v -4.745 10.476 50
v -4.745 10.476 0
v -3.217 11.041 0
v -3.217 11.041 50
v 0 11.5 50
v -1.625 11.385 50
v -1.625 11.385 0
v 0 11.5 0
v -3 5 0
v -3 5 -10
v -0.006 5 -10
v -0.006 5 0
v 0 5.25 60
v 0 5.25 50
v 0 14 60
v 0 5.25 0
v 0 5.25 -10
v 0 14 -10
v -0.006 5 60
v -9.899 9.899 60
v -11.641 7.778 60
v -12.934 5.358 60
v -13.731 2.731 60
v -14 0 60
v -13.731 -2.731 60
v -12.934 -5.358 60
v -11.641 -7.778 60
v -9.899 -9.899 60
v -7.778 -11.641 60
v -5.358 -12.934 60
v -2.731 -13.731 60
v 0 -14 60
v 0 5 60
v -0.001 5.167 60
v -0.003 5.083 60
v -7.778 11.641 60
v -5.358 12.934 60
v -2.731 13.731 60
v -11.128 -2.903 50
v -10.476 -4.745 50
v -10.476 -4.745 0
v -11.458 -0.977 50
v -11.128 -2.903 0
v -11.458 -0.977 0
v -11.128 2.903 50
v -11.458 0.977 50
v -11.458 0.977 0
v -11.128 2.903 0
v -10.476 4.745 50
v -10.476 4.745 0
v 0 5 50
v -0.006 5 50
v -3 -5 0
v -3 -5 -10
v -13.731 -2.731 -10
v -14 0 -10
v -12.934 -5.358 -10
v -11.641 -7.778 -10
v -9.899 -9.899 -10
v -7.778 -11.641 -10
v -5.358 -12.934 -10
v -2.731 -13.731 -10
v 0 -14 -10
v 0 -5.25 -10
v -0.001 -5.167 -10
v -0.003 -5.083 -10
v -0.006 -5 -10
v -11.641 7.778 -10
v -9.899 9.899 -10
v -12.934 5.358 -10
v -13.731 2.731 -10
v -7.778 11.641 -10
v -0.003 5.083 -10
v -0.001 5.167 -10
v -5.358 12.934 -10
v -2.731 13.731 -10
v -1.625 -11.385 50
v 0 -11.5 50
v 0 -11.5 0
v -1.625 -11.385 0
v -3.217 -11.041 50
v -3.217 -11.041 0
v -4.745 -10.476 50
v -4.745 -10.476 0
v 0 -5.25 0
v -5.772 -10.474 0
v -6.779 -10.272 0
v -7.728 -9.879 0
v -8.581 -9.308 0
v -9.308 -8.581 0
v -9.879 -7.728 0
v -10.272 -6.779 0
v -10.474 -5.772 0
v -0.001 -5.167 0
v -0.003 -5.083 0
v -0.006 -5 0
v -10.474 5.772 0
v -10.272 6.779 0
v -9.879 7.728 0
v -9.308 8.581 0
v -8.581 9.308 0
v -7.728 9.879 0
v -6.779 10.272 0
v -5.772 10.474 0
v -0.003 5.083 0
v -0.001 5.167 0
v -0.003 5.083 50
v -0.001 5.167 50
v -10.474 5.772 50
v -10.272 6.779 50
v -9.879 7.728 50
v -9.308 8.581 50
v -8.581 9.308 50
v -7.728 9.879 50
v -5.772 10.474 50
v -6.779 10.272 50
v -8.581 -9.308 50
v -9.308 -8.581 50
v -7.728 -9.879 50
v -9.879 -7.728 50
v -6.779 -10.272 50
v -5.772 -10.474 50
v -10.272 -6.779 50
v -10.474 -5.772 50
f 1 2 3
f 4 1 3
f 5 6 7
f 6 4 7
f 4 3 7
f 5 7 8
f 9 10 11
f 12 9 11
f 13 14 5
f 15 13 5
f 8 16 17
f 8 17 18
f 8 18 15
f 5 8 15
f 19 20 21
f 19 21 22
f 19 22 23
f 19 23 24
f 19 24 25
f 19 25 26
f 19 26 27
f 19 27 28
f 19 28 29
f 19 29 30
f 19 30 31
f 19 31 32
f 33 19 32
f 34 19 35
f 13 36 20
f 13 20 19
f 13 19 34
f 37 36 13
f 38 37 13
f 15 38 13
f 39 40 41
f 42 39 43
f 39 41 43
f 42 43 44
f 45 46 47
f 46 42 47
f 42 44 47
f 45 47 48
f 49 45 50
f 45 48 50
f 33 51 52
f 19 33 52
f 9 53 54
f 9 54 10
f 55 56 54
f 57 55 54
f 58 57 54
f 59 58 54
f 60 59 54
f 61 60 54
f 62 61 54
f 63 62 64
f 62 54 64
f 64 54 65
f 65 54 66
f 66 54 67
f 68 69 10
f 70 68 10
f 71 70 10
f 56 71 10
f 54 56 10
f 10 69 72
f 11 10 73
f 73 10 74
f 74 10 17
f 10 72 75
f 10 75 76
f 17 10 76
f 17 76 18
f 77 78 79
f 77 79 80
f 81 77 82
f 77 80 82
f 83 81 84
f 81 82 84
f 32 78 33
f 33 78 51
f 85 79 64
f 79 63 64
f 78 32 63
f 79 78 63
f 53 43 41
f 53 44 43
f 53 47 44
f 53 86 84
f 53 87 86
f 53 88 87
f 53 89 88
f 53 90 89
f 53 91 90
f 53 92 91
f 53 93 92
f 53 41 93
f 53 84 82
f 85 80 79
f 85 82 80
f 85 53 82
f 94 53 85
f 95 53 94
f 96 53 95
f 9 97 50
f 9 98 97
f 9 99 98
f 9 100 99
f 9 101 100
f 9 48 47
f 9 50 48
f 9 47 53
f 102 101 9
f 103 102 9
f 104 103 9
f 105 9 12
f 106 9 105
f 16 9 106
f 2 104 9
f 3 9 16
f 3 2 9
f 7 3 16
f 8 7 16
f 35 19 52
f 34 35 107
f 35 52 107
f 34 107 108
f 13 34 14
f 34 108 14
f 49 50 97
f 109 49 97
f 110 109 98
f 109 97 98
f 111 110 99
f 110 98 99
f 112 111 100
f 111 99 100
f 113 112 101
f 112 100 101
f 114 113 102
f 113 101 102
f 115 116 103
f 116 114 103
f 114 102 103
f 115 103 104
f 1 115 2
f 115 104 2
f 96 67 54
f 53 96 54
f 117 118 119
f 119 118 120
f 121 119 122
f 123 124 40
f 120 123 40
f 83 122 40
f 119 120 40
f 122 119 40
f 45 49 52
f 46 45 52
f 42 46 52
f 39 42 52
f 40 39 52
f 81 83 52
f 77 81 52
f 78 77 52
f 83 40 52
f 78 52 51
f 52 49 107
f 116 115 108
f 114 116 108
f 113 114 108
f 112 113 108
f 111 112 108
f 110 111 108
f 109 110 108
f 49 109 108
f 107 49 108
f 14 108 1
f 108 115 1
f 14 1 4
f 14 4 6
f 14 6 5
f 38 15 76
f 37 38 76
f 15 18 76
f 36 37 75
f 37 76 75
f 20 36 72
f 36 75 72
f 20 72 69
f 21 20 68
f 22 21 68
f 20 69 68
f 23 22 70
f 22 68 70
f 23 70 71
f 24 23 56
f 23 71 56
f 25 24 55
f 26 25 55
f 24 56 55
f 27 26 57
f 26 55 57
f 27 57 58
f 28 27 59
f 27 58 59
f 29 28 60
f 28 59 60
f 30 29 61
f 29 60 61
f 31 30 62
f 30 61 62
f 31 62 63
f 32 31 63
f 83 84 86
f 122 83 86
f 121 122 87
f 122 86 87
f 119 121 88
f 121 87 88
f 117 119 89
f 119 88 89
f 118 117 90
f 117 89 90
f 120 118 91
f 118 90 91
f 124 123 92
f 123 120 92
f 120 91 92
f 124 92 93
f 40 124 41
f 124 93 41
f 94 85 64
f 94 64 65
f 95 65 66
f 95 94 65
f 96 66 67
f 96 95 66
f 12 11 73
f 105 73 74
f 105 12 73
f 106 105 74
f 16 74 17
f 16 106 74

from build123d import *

# Parameters (mm, degrees)
F1_DEPTH = 10
F2_DEPTH = 50
F3_DEPTH = 10
F4_START = 50
F4_DEPTH = 10


# Not quite as in the source:
# - a feature names something its author has since deleted; it is built from what else it names


with BuildPart() as f1:
    # F0 (on Top) → F1 (new body)
    with BuildSketch(Plane.XY):
        with BuildLine():
            Line((0, 11.5), (0, 14))
            ThreePointArc((0, 14), (-14, 0), (0, -14))
            Line((0, -14), (0, -11.5))
            ThreePointArc((0, -11.5), (-2.4269719101, -11.2409878279), (-4.7446194261, -10.4756186692))
            ThreePointArc((-4.7446194261, -10.4756186692), (-8.9623106012, -8.9623106012), (-10.4756186692, -4.7446194261))
            ThreePointArc((-10.4756186692, -4.7446194261), (-11.5, 0), (-10.4756186692, 4.7446194261))
            ThreePointArc((-10.4756186692, 4.7446194261), (-8.9623106012, 8.9623106012), (-4.7446194261, 10.4756186692))
            ThreePointArc((-4.7446194261, 10.4756186692), (-2.4269719101, 11.2409878279), (0, 11.5))
        make_face()
        with BuildLine():
            ThreePointArc((-4.7446194261, -10.4756186692), (-2.4269719101, -11.2409878279), (0, -11.5))
            Line((0, -11.5), (0, -9))
            Line((0, -9), (0, -5.25))
            ThreePointArc((0, -5.25), (-1.3631151282, -8.7791112186), (-4.7446194261, -10.4756186692))
        make_face()
        with BuildLine():
            Line((-5.25, -5.25), (0, -5.25))
            ThreePointArc((0, -5.25), (-0.001489151, -5.124964534), (-0.0059557591, -5))
            Line((-0.0059557591, -5), (-3, -5))
            Line((-3, -5), (-3, -0.5065835097))
            ThreePointArc((-3, -0.5065835097), (-4.0968383837, -0.1282114172), (-5.2499999999, 0))
            Line((-5.25, 0), (-5.25, -5.25))
        make_face()
        with BuildLine():
            ThreePointArc((-10.4756186692, -4.7446194261), (-8.1317279836, -8.1317279836), (-4.7446194261, -10.4756186692))
            ThreePointArc((-4.7446194261, -10.4756186692), (-1.3631151282, -8.7791112186), (0, -5.25))
            Line((0, -5.25), (-5.25, -5.25))
            Line((-5.25, -5.25), (-5.25, 0))
            ThreePointArc((-5.2499999999, 0), (-8.7791112186, -1.3631151282), (-10.4756186692, -4.7446194261))
        make_face()
        with BuildLine():
            ThreePointArc((-5.2499999999, 0), (-8.7791112186, 1.3631151282), (-10.4756186692, 4.7446194261))
            ThreePointArc((-10.4756186692, 4.7446194261), (-11.5, 0), (-10.4756186692, -4.7446194261))
            ThreePointArc((-10.4756186692, -4.7446194261), (-8.7791112186, -1.3631151282), (-5.2499999999, 0))
        make_face()
        with BuildLine():
            ThreePointArc((-3, 0.5065835097), (-4.0968383837, 0.1282114172), (-5.2499999999, 0))
            ThreePointArc((-5.2499999999, 0), (-4.0968383837, -0.1282114172), (-3, -0.5065835097))
            Line((-3, -0.5065835097), (-3, 0.5065835097))
        make_face()
        with BuildLine():
            ThreePointArc((0, 5.25), (-1.3631151282, 8.7791112186), (-4.7446194261, 10.4756186692))
            ThreePointArc((-4.7446194261, 10.4756186692), (-8.1317279836, 8.1317279836), (-10.4756186692, 4.7446194261))
            ThreePointArc((-10.4756186692, 4.7446194261), (-8.7791112186, 1.3631151282), (-5.2499999999, 0))
            Line((-5.25, 0), (-5.25, 5.25))
            Line((-5.25, 5.25), (0, 5.25))
        make_face()
        with BuildLine():
            Line((0, 9), (0, 11.5))
            ThreePointArc((0, 11.5), (-2.4269719101, 11.2409878279), (-4.7446194261, 10.4756186692))
            ThreePointArc((-4.7446194261, 10.4756186692), (-1.3631151282, 8.7791112186), (0, 5.25))
            Line((0, 5.25), (0, 6))
            Line((0, 6), (0, 9))
        make_face()
        with BuildLine():
            ThreePointArc((-10.4756186692, 4.7446194261), (-8.1317279836, 8.1317279836), (-4.7446194261, 10.4756186692))
            ThreePointArc((-4.7446194261, 10.4756186692), (-8.9623106012, 8.9623106012), (-10.4756186692, 4.7446194261))
        make_face()
        with BuildLine():
            ThreePointArc((-10.4756186692, -4.7446194261), (-8.9623106012, -8.9623106012), (-4.7446194261, -10.4756186692))
            ThreePointArc((-4.7446194261, -10.4756186692), (-8.1317279836, -8.1317279836), (-10.4756186692, -4.7446194261))
        make_face()
        with BuildLine():
            ThreePointArc((-0.0059557591, 5), (-0.001489151, 5.124964534), (0, 5.25))
            Line((0, 5.25), (-5.25, 5.25))
            Line((-5.25, 5.25), (-5.25, 0))
            ThreePointArc((-5.2499999999, 0), (-4.0968383837, 0.1282114172), (-3, 0.5065835097))
            Line((-3, 0.5065835097), (-3, 5))
            Line((-3, 5), (-0.0059557591, 5))
        make_face()
    extrude(amount=-F1_DEPTH)

    # F0 (on Top) → F2 (join)
    with BuildSketch(Plane.XY):
        with BuildLine():
            Line((0, 11.5), (0, 14))
            ThreePointArc((0, 14), (-14, 0), (0, -14))
            Line((0, -14), (0, -11.5))
            ThreePointArc((0, -11.5), (-2.4269719101, -11.2409878279), (-4.7446194261, -10.4756186692))
            ThreePointArc((-4.7446194261, -10.4756186692), (-8.9623106012, -8.9623106012), (-10.4756186692, -4.7446194261))
            ThreePointArc((-10.4756186692, -4.7446194261), (-11.5, 0), (-10.4756186692, 4.7446194261))
            ThreePointArc((-10.4756186692, 4.7446194261), (-8.9623106012, 8.9623106012), (-4.7446194261, 10.4756186692))
            ThreePointArc((-4.7446194261, 10.4756186692), (-2.4269719101, 11.2409878279), (0, 11.5))
        make_face()
    extrude(amount=F2_DEPTH)

    # F3 (add): a face of the model
    f3_faces = [f1.faces().sort_by_distance(p)[0] for p in [
        (-2.4930382043, 11.5469865939, 50),
    ]]
    extrude(f3_faces, amount=F3_DEPTH)

    # F0 (on Top) → F4 (join)
    with BuildSketch(Plane.XY.offset(F4_START)):
        with BuildLine():
            Line((0, 9), (0, 11.5))
            ThreePointArc((0, 11.5), (-2.4269719101, 11.2409878279), (-4.7446194261, 10.4756186692))
            ThreePointArc((-4.7446194261, 10.4756186692), (-1.3631151282, 8.7791112186), (0, 5.25))
            Line((0, 5.25), (0, 6))
            Line((0, 6), (0, 9))
        make_face()
        with BuildLine():
            ThreePointArc((-4.7446194261, -10.4756186692), (-2.4269719101, -11.2409878279), (0, -11.5))
            Line((0, -11.5), (0, -9))
            Line((0, -9), (0, -5.25))
            ThreePointArc((0, -5.25), (-1.3631151282, -8.7791112186), (-4.7446194261, -10.4756186692))
        make_face()
        with BuildLine():
            ThreePointArc((0, 5.25), (-1.3631151282, 8.7791112186), (-4.7446194261, 10.4756186692))
            ThreePointArc((-4.7446194261, 10.4756186692), (-8.1317279836, 8.1317279836), (-10.4756186692, 4.7446194261))
            ThreePointArc((-10.4756186692, 4.7446194261), (-8.7791112186, 1.3631151282), (-5.2499999999, 0))
            Line((-5.25, 0), (-5.25, 5.25))
            Line((-5.25, 5.25), (0, 5.25))
        make_face()
        with BuildLine():
            ThreePointArc((-10.4756186692, 4.7446194261), (-8.1317279836, 8.1317279836), (-4.7446194261, 10.4756186692))
            ThreePointArc((-4.7446194261, 10.4756186692), (-8.9623106012, 8.9623106012), (-10.4756186692, 4.7446194261))
        make_face()
        with BuildLine():
            ThreePointArc((-10.4756186692, -4.7446194261), (-8.9623106012, -8.9623106012), (-4.7446194261, -10.4756186692))
            ThreePointArc((-4.7446194261, -10.4756186692), (-8.1317279836, -8.1317279836), (-10.4756186692, -4.7446194261))
        make_face()
        with BuildLine():
            ThreePointArc((-10.4756186692, -4.7446194261), (-8.1317279836, -8.1317279836), (-4.7446194261, -10.4756186692))
            ThreePointArc((-4.7446194261, -10.4756186692), (-1.3631151282, -8.7791112186), (0, -5.25))
            Line((0, -5.25), (-5.25, -5.25))
            Line((-5.25, -5.25), (-5.25, 0))
            ThreePointArc((-5.2499999999, 0), (-8.7791112186, -1.3631151282), (-10.4756186692, -4.7446194261))
        make_face()
        with BuildLine():
            ThreePointArc((-5.2499999999, 0), (-8.7791112186, 1.3631151282), (-10.4756186692, 4.7446194261))
            ThreePointArc((-10.4756186692, 4.7446194261), (-11.5, 0), (-10.4756186692, -4.7446194261))
            ThreePointArc((-10.4756186692, -4.7446194261), (-8.7791112186, -1.3631151282), (-5.2499999999, 0))
        make_face()
        with BuildLine():
            ThreePointArc((-0.0059557591, 5), (-0.001489151, 5.124964534), (0, 5.25))
            Line((0, 5.25), (-5.25, 5.25))
            Line((-5.25, 5.25), (-5.25, 0))
            ThreePointArc((-5.2499999999, 0), (-4.0968383837, 0.1282114172), (-3, 0.5065835097))
            Line((-3, 0.5065835097), (-3, 5))
            Line((-3, 5), (-0.0059557591, 5))
        make_face()
        with BuildLine():
            ThreePointArc((-0.0059557591, -5), (-0.001489151, -5.124964534), (0, -5.25))
            Line((0, -5.25), (0, -5))
            Line((0, -5), (-0.0059557591, -5))
        make_face()
        with BuildLine():
            Line((-5.25, -5.25), (0, -5.25))
            ThreePointArc((0, -5.25), (-0.001489151, -5.124964534), (-0.0059557591, -5))
            Line((-0.0059557591, -5), (-3, -5))
            Line((-3, -5), (-3, -0.5065835097))
            ThreePointArc((-3, -0.5065835097), (-4.0968383837, -0.1282114172), (-5.2499999999, 0))
            Line((-5.25, 0), (-5.25, -5.25))
        make_face()
        with BuildLine():
            ThreePointArc((-3, 0.5065835097), (-4.0968383837, 0.1282114172), (-5.2499999999, 0))
            ThreePointArc((-5.2499999999, 0), (-4.0968383837, -0.1282114172), (-3, -0.5065835097))
            Line((-3, -0.5065835097), (-3, 0.5065835097))
        make_face()
        with BuildLine():
            Line((0, 0), (0, 5))
            Line((0, 5), (-0.0059557591, 5))
            ThreePointArc((-0.0059557591, 5), (-0.8810329928, 2.3388786885), (-3, 0.5065835097))
            Line((-3, 0.5065835097), (-3, -0.5065835097))
            ThreePointArc((-3, -0.5065835097), (-0.8810329928, -2.3388786885), (-0.0059557591, -5))
            Line((-0.0059557591, -5), (0, -5))
            Line((0, -5), (0, 0))
        make_face()
        with BuildLine():
            ThreePointArc((-3, 0.5065835097), (-0.8810329928, 2.3388786885), (-0.0059557591, 5))
            Line((-0.0059557591, 5), (-3, 5))
            Line((-3, 5), (-3, 0.5065835097))
        make_face()
        with BuildLine():
            Line((-3, -5), (-0.0059557591, -5))
            ThreePointArc((-0.0059557591, -5), (-0.8810329928, -2.3388786885), (-3, -0.5065835097))
            Line((-3, -0.5065835097), (-3, -5))
        make_face()
    extrude(amount=F4_DEPTH)


solid = f1.part
